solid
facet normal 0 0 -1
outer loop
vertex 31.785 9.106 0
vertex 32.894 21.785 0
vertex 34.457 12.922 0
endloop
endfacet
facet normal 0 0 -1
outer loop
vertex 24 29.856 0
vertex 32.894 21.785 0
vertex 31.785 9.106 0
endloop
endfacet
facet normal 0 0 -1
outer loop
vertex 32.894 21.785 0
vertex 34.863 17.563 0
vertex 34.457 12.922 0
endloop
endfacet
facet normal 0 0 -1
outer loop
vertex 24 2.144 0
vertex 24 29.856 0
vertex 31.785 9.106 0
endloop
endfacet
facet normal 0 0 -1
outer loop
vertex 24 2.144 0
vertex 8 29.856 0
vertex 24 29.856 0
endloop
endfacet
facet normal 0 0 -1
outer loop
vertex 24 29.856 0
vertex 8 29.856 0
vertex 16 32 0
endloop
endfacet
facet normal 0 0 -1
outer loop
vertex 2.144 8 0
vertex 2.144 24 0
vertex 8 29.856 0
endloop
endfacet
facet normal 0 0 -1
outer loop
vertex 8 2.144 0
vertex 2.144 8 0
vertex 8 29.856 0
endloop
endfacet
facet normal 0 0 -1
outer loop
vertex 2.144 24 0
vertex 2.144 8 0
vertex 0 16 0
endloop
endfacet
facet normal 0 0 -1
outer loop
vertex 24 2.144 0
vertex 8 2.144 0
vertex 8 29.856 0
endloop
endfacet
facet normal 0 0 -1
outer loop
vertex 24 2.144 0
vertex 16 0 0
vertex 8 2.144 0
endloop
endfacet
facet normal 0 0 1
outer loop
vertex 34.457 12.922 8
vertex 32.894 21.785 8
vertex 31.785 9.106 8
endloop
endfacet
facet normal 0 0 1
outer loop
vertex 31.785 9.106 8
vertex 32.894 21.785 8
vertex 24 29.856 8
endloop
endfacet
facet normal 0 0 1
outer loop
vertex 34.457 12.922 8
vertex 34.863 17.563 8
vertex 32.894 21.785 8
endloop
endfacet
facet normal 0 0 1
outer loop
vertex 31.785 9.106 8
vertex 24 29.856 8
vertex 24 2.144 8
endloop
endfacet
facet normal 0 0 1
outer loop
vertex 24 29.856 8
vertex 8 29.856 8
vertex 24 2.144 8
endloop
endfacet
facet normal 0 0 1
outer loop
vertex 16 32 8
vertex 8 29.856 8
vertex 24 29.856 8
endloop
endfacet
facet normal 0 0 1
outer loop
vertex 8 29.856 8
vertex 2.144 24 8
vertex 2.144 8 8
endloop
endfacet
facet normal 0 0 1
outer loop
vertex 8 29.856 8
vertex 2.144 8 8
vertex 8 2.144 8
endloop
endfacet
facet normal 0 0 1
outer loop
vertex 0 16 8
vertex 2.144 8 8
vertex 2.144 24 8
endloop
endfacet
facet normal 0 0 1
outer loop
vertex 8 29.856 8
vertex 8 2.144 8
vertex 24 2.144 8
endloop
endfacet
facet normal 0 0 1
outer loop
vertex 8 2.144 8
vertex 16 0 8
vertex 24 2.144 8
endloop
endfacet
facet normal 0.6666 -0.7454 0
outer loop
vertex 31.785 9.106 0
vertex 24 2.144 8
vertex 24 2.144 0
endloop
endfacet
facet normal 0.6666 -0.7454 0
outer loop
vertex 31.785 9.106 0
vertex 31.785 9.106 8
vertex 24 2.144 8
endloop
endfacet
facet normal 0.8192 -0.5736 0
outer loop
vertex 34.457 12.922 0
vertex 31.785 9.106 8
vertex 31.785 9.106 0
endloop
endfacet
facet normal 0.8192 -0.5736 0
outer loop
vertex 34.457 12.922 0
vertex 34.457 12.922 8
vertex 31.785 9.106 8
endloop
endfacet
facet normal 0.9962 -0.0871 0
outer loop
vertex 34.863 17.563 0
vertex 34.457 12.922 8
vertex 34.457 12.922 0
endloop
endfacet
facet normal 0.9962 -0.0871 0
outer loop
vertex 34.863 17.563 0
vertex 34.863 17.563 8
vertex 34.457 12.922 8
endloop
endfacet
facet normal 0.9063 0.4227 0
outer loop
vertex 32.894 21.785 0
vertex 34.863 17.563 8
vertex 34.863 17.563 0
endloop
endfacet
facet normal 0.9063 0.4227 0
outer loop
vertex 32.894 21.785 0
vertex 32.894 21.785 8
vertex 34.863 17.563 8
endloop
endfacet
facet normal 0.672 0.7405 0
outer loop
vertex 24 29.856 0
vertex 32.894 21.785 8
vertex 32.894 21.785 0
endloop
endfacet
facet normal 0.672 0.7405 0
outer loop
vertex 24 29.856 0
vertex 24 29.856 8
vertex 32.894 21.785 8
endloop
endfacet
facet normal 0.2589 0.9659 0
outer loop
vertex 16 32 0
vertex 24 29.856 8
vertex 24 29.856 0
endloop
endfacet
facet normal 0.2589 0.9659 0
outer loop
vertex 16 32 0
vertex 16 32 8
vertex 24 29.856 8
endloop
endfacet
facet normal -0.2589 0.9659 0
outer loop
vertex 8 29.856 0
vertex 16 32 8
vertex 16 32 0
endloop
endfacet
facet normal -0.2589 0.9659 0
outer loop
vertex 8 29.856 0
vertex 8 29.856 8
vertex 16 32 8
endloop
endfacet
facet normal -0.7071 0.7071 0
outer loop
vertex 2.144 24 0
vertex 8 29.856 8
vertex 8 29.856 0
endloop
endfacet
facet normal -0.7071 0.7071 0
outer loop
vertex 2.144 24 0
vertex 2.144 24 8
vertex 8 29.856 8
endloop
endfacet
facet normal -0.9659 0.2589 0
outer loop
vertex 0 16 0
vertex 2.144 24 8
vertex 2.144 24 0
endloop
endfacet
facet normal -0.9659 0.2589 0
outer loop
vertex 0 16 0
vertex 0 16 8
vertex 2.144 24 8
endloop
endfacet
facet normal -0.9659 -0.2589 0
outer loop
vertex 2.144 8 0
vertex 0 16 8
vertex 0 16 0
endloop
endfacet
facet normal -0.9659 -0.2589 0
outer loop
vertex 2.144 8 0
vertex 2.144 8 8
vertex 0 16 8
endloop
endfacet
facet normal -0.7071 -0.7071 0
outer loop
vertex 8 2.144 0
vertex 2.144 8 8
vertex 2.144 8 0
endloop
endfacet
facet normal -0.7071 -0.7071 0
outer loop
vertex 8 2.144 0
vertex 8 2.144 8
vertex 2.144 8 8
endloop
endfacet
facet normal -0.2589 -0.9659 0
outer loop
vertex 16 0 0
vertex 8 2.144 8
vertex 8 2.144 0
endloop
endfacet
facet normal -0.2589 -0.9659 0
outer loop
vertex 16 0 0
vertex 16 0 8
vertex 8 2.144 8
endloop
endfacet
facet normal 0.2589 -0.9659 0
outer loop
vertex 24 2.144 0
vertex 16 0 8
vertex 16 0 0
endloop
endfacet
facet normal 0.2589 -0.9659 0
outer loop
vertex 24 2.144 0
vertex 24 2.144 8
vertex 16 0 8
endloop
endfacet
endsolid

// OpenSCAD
$fn = 32;

// ----------------------------------------------------------------------
// Eccentric disc: step, 8 mm thick
// ----------------------------------------------------------------------

// --- parameters (mm) ---
profile_height = 8;       // extrusion height
profile_points = 13;      // points of the closed outline

profile = [[0, 16], [2.144, 8], [8, 2.144], [16, 0], [24, 2.144], [31.785, 9.106], [34.457, 12.922], [34.863, 17.563], [32.894, 21.785], [24, 29.856], [16, 32], [8, 29.856], [2.144, 24]];  // single closed polygon, 13 points, counter clockwise

// --- the one profile operation ---
linear_extrude(height = profile_height) polygon(points = profile);
